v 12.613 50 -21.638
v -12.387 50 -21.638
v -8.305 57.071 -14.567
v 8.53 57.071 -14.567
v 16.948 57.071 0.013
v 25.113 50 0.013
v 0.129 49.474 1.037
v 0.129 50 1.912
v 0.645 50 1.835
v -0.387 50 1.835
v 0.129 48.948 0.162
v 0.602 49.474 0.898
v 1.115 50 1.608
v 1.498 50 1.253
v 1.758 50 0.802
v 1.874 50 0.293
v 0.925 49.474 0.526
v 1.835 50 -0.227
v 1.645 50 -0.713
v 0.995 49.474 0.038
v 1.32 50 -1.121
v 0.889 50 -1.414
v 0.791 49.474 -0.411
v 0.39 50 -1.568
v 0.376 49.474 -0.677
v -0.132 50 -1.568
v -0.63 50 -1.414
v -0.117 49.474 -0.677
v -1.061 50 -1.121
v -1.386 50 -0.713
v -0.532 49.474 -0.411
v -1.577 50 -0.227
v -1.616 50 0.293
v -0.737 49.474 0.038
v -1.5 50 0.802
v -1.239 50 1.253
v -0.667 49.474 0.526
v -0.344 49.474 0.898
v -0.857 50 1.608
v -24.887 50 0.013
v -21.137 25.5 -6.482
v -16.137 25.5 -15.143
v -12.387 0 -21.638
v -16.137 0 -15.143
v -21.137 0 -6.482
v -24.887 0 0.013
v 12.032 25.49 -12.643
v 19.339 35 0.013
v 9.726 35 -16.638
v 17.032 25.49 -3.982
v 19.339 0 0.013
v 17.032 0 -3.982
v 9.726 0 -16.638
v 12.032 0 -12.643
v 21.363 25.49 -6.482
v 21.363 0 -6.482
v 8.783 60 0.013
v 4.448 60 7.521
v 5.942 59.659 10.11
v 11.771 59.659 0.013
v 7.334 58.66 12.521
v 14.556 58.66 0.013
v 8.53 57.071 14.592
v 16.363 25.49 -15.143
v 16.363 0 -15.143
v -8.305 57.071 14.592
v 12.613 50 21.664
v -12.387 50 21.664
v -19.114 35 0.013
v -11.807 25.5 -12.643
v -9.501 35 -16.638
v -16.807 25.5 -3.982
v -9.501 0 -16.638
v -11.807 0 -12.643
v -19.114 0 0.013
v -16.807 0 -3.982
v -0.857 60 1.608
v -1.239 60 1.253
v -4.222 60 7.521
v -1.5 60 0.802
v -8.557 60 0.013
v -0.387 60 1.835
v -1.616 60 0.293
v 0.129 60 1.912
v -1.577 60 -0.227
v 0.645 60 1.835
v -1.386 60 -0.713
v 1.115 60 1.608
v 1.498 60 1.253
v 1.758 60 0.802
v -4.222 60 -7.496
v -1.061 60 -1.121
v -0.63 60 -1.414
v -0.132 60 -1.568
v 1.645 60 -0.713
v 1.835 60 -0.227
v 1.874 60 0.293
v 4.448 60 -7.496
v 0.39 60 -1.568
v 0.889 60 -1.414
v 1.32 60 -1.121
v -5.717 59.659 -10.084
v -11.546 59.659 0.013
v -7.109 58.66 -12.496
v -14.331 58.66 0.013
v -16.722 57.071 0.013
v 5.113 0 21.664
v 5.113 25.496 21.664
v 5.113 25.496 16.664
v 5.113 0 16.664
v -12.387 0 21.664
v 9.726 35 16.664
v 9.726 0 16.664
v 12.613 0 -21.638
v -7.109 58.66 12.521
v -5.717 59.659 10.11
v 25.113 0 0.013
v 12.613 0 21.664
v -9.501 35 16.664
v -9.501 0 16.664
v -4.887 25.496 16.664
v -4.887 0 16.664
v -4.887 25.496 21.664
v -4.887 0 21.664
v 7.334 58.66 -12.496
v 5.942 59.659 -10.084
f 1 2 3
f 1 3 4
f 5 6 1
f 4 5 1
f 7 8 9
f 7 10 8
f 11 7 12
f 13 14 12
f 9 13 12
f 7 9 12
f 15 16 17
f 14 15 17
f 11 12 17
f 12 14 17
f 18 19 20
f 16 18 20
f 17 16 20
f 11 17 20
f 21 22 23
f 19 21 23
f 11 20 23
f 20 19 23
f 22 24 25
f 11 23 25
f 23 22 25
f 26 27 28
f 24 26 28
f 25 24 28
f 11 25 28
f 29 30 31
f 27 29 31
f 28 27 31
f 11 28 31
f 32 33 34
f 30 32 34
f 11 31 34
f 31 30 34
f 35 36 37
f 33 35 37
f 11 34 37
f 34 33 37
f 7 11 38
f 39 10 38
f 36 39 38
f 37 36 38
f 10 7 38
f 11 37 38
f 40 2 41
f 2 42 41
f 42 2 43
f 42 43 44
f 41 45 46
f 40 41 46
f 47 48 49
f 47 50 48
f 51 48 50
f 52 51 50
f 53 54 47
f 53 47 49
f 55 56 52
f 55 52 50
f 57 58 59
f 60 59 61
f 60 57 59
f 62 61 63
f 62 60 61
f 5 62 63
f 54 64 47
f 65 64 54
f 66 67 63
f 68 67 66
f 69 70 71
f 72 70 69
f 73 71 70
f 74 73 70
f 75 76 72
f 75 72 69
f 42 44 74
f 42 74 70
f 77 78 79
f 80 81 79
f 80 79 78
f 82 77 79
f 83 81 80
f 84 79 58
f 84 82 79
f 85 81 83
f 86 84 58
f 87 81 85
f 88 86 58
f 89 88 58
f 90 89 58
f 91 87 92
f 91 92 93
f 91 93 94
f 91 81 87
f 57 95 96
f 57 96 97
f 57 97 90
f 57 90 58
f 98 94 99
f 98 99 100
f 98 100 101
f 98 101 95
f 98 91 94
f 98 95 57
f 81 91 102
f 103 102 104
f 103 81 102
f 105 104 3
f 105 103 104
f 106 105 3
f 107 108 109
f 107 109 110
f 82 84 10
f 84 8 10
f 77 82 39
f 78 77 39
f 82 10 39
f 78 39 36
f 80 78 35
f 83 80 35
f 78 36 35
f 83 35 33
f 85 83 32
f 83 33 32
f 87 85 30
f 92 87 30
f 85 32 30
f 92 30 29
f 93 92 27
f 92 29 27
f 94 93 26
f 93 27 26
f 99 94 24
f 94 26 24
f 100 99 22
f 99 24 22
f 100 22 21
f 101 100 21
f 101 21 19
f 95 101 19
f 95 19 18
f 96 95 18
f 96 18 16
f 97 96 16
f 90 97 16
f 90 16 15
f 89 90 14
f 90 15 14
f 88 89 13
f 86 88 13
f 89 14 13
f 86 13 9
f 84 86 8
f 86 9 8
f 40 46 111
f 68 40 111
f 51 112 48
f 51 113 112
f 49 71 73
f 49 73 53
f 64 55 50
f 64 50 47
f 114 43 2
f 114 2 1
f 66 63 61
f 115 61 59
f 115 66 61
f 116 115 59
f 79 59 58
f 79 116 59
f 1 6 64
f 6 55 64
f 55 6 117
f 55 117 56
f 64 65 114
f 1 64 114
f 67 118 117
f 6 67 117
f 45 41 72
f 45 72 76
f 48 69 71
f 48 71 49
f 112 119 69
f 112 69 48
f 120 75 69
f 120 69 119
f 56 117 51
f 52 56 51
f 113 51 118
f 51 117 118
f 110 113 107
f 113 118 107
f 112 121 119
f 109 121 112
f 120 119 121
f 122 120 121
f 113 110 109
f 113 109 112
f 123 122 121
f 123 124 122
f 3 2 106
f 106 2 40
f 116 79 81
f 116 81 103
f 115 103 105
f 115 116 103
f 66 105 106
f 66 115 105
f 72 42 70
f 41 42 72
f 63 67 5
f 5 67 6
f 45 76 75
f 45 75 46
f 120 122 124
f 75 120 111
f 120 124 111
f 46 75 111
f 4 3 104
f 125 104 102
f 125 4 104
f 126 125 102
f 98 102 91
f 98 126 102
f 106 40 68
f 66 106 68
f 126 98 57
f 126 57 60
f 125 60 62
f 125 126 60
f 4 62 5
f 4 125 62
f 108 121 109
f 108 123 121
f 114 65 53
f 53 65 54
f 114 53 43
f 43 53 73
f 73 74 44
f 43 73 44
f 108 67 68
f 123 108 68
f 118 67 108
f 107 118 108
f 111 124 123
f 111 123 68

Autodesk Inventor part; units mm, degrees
ref_plane "YZ Plane" through (0, 0, 0) normal (1, 0, 0) x (0, 1, 0)
ref_plane "XZ Plane" through (0, 0, 0) normal (0, 1, 0) x (-1, 0, 0)
ref_plane "XY Plane" through (0, 0, 0) normal (0, 0, 1) x (1, 0, 0)
sketch "Sketch2" plane through (0, 0, 0) normal (0, 1, 0) x (-1, 0, 0)
  line L0 (-0.1126, -21.6377) -> (12.3874, -21.6377)
  line L1 (-0.1126, -21.6377) -> (-12.6126, -21.6377)
  line L2 (12.3874, -21.6377) -> (24.8874, 0.0129)
  line L3 (24.8874, 0.0129) -> (12.3874, 21.6635)
  line L4 (12.3874, 21.6635) -> (-12.6126, 21.6635)
  line L5 (-12.6126, 21.6635) -> (-25.1126, 0.0129)
  line L6 (-25.1126, 0.0129) -> (-12.6126, -21.6377)
  point P0 (0, 0)
  dimension "d12" = 12.5
  dimension "d13" = 12.5
  dimension "d14" = 25
  dimension "d15" = 25
  dimension "d16" = 120
  dimension "d17" = 25
  dimension "d18" = 25
  dimension "d19" = 120
extrude "Extrusion2" add sketch "Sketch2" along normal blind 50
shell "Shell1" thickness 5 removed faces 1 at (0.1126, 0, 7.2298)
sketch "Sketch3" plane through (-12.3874, 0, 21.6635) normal (0, 0, 1) x (1, 0, 0)
  line L0 (7.5, 25.4958) -> (17.5, 25.4958)
  line L1 (17.5, 25.4958) -> (17.5, -0.0042)
  line L2 (17.5, -0.0042) -> (7.5, -0.0042)
  line L3 (7.5, -0.0042) -> (7.5, 25.4958)
  line L4 (0, 0) -> (0, 50) projected
  point P0 (12.3874, 0)
  dimension "d23" = 25.5
  dimension "d24" = 10
  dimension "d25" = 7.5
extrude "Extrusion3" cut sketch "Sketch3" against normal blind 5
sketch "Sketch4" plane through (12.6126, 0, -21.6377) normal (0.8660254, 0, -0.5) x (-0.5, 0, -0.8660254)
  line L0 (-17.5, 25.4905) -> (-7.5, 25.4905)
  line L1 (-7.5, 25.4905) -> (-7.5, -0.0095)
  line L2 (-7.5, -0.0095) -> (-17.5, -0.0095)
  line L3 (-17.5, -0.0095) -> (-17.5, 25.4905)
  line L4 (-25, 0) -> (-25, 50) projected
  point P0 (-12.4325, 0)
  point P1 (12.3874, 0)
  dimension "d28" = 25.5
  dimension "d29" = 10
  dimension "d30" = 7.5
extrude "Extrusion4" cut sketch "Sketch4" against normal blind 5
sketch "Sketch5" plane through (-24.8874, 0, 0.0129) normal (-0.8660254, 0, -0.5) x (-0.5, 0, 0.8660254)
  line L0 (-17.5, 25.4996) -> (-7.5, 25.4996)
  line L1 (-7.5, 25.4996) -> (-7.5, -0.0004)
  line L2 (-7.5, -0.0004) -> (-17.5, -0.0004)
  line L3 (-17.5, -0.0004) -> (-17.5, 25.4996)
  line L4 (-25, 0) -> (-25, 50) projected
  point P0 (-12.4549, 0)
  point P1 (12.3874, 0)
  dimension "d33" = 25.5
  dimension "d34" = 10
  dimension "d35" = 7.5
extrude "Extrusion5" cut sketch "Sketch5" against normal blind 5
sketch "Sketch7" plane through (0, 50, 0) normal (0, 1, 0) x (1, 0, 0)
  circle A0 centre (0, 0) radius 13.5
  dimension "d39" = 27
extrude "Extrusion6" add sketch "Sketch7" along normal blind 10 and the other way blind 15
sketch "Sketch11" plane through (-9.5006, 45, -16.6377) normal (0, -1, 0) x (1, 0, 0)
  line L0 (-9.6132, 16.6506) -> (0, 33.3013) projected
  line L1 (0, 33.3013) -> (19.2265, 33.3013) projected
  line L2 (0, 33.3013) -> (19.2265, 33.3013)
  line L3 (19.2265, 33.3013) -> (28.8397, 16.6506) projected
  line L4 (19.2265, 33.3013) -> (28.8397, 16.6506)
  line L5 (28.8397, 16.6506) -> (19.2265, 0) projected
  line L6 (28.8397, 16.6506) -> (19.2265, 0)
  line L7 (19.2265, 0) -> (0, 0) projected
  line L8 (19.2265, 0) -> (0, 0)
  line L9 (0, 0) -> (-9.6132, 16.6506)
  line L10 (-9.6132, 16.6506) -> (0, 33.3013)
  point P0 (9.5006, 16.6377)
extrude "Extrusion8" add sketch "Sketch11" along normal blind 10
sketch "Sketch12" plane through (0, 50, 0) normal (0, 1, 0) x (1, 0, 0)
  line L0 (-12.3874, 21.6377) -> (-24.8874, -0.0129) projected
  line L1 (25.1126, -0.0129) -> (12.6126, 21.6377) projected
  line L2 (-12.3874, 21.6377) -> (12.6126, 21.6377)
  line L3 (12.6126, 21.6377) -> (25.1126, -0.0129)
  line L4 (12.6126, -21.6635) -> (25.1126, -0.0129) projected
  line L5 (25.1126, -0.0129) -> (12.6126, -21.6635)
  line L6 (12.6126, -21.6635) -> (-12.3874, -21.6635)
  line L7 (-24.8874, -0.0129) -> (-12.3874, -21.6635) projected
  line L8 (-12.3874, -21.6635) -> (-24.8874, -0.0129)
  line L9 (-24.8874, -0.0129) -> (-12.3874, 21.6377)
  point P0 (0, 0)
extrude "Extrusion9" add sketch "Sketch12" along normal blind 10
chamfer "Chamfer1" distance 10 angle 45 1 edges at (0.1126, 60, 21.6635)
chamfer "Chamfer2" distance 10 angle 45 1 edges at (21.7494, 60, 5.8382)
chamfer "Chamfer3" distance 10 angle 45 1 edges at (-21.5241, 60, 5.8382)
chamfer "Chamfer4" distance 10 angle 45 1 edges at (-15.7506, 60, -15.8124)
chamfer "Chamfer5" distance 10 angle 45 1 edges at (5.8861, 60, -21.6377)
chamfer "Chamfer6" distance 10 angle 45 1 edges at (18.8626, 60, -10.8124)
fillet "Fillet9" radius 10 6 edges at (10.2024, 60, 5.8382) (10.2024, 60, -5.8124) (0.1126, 60, -11.6377) (-9.9771, 60, -5.8124) (-9.9771, 60, 5.8382) (0.1126, 60, 11.6635)
hole "Hole2" at (0.1293, 60, 0.1623) direction (0, -1, 0) diameter 3.5 depth 10 tip angle 118
properties part number "center" material "ABS Plastic"
